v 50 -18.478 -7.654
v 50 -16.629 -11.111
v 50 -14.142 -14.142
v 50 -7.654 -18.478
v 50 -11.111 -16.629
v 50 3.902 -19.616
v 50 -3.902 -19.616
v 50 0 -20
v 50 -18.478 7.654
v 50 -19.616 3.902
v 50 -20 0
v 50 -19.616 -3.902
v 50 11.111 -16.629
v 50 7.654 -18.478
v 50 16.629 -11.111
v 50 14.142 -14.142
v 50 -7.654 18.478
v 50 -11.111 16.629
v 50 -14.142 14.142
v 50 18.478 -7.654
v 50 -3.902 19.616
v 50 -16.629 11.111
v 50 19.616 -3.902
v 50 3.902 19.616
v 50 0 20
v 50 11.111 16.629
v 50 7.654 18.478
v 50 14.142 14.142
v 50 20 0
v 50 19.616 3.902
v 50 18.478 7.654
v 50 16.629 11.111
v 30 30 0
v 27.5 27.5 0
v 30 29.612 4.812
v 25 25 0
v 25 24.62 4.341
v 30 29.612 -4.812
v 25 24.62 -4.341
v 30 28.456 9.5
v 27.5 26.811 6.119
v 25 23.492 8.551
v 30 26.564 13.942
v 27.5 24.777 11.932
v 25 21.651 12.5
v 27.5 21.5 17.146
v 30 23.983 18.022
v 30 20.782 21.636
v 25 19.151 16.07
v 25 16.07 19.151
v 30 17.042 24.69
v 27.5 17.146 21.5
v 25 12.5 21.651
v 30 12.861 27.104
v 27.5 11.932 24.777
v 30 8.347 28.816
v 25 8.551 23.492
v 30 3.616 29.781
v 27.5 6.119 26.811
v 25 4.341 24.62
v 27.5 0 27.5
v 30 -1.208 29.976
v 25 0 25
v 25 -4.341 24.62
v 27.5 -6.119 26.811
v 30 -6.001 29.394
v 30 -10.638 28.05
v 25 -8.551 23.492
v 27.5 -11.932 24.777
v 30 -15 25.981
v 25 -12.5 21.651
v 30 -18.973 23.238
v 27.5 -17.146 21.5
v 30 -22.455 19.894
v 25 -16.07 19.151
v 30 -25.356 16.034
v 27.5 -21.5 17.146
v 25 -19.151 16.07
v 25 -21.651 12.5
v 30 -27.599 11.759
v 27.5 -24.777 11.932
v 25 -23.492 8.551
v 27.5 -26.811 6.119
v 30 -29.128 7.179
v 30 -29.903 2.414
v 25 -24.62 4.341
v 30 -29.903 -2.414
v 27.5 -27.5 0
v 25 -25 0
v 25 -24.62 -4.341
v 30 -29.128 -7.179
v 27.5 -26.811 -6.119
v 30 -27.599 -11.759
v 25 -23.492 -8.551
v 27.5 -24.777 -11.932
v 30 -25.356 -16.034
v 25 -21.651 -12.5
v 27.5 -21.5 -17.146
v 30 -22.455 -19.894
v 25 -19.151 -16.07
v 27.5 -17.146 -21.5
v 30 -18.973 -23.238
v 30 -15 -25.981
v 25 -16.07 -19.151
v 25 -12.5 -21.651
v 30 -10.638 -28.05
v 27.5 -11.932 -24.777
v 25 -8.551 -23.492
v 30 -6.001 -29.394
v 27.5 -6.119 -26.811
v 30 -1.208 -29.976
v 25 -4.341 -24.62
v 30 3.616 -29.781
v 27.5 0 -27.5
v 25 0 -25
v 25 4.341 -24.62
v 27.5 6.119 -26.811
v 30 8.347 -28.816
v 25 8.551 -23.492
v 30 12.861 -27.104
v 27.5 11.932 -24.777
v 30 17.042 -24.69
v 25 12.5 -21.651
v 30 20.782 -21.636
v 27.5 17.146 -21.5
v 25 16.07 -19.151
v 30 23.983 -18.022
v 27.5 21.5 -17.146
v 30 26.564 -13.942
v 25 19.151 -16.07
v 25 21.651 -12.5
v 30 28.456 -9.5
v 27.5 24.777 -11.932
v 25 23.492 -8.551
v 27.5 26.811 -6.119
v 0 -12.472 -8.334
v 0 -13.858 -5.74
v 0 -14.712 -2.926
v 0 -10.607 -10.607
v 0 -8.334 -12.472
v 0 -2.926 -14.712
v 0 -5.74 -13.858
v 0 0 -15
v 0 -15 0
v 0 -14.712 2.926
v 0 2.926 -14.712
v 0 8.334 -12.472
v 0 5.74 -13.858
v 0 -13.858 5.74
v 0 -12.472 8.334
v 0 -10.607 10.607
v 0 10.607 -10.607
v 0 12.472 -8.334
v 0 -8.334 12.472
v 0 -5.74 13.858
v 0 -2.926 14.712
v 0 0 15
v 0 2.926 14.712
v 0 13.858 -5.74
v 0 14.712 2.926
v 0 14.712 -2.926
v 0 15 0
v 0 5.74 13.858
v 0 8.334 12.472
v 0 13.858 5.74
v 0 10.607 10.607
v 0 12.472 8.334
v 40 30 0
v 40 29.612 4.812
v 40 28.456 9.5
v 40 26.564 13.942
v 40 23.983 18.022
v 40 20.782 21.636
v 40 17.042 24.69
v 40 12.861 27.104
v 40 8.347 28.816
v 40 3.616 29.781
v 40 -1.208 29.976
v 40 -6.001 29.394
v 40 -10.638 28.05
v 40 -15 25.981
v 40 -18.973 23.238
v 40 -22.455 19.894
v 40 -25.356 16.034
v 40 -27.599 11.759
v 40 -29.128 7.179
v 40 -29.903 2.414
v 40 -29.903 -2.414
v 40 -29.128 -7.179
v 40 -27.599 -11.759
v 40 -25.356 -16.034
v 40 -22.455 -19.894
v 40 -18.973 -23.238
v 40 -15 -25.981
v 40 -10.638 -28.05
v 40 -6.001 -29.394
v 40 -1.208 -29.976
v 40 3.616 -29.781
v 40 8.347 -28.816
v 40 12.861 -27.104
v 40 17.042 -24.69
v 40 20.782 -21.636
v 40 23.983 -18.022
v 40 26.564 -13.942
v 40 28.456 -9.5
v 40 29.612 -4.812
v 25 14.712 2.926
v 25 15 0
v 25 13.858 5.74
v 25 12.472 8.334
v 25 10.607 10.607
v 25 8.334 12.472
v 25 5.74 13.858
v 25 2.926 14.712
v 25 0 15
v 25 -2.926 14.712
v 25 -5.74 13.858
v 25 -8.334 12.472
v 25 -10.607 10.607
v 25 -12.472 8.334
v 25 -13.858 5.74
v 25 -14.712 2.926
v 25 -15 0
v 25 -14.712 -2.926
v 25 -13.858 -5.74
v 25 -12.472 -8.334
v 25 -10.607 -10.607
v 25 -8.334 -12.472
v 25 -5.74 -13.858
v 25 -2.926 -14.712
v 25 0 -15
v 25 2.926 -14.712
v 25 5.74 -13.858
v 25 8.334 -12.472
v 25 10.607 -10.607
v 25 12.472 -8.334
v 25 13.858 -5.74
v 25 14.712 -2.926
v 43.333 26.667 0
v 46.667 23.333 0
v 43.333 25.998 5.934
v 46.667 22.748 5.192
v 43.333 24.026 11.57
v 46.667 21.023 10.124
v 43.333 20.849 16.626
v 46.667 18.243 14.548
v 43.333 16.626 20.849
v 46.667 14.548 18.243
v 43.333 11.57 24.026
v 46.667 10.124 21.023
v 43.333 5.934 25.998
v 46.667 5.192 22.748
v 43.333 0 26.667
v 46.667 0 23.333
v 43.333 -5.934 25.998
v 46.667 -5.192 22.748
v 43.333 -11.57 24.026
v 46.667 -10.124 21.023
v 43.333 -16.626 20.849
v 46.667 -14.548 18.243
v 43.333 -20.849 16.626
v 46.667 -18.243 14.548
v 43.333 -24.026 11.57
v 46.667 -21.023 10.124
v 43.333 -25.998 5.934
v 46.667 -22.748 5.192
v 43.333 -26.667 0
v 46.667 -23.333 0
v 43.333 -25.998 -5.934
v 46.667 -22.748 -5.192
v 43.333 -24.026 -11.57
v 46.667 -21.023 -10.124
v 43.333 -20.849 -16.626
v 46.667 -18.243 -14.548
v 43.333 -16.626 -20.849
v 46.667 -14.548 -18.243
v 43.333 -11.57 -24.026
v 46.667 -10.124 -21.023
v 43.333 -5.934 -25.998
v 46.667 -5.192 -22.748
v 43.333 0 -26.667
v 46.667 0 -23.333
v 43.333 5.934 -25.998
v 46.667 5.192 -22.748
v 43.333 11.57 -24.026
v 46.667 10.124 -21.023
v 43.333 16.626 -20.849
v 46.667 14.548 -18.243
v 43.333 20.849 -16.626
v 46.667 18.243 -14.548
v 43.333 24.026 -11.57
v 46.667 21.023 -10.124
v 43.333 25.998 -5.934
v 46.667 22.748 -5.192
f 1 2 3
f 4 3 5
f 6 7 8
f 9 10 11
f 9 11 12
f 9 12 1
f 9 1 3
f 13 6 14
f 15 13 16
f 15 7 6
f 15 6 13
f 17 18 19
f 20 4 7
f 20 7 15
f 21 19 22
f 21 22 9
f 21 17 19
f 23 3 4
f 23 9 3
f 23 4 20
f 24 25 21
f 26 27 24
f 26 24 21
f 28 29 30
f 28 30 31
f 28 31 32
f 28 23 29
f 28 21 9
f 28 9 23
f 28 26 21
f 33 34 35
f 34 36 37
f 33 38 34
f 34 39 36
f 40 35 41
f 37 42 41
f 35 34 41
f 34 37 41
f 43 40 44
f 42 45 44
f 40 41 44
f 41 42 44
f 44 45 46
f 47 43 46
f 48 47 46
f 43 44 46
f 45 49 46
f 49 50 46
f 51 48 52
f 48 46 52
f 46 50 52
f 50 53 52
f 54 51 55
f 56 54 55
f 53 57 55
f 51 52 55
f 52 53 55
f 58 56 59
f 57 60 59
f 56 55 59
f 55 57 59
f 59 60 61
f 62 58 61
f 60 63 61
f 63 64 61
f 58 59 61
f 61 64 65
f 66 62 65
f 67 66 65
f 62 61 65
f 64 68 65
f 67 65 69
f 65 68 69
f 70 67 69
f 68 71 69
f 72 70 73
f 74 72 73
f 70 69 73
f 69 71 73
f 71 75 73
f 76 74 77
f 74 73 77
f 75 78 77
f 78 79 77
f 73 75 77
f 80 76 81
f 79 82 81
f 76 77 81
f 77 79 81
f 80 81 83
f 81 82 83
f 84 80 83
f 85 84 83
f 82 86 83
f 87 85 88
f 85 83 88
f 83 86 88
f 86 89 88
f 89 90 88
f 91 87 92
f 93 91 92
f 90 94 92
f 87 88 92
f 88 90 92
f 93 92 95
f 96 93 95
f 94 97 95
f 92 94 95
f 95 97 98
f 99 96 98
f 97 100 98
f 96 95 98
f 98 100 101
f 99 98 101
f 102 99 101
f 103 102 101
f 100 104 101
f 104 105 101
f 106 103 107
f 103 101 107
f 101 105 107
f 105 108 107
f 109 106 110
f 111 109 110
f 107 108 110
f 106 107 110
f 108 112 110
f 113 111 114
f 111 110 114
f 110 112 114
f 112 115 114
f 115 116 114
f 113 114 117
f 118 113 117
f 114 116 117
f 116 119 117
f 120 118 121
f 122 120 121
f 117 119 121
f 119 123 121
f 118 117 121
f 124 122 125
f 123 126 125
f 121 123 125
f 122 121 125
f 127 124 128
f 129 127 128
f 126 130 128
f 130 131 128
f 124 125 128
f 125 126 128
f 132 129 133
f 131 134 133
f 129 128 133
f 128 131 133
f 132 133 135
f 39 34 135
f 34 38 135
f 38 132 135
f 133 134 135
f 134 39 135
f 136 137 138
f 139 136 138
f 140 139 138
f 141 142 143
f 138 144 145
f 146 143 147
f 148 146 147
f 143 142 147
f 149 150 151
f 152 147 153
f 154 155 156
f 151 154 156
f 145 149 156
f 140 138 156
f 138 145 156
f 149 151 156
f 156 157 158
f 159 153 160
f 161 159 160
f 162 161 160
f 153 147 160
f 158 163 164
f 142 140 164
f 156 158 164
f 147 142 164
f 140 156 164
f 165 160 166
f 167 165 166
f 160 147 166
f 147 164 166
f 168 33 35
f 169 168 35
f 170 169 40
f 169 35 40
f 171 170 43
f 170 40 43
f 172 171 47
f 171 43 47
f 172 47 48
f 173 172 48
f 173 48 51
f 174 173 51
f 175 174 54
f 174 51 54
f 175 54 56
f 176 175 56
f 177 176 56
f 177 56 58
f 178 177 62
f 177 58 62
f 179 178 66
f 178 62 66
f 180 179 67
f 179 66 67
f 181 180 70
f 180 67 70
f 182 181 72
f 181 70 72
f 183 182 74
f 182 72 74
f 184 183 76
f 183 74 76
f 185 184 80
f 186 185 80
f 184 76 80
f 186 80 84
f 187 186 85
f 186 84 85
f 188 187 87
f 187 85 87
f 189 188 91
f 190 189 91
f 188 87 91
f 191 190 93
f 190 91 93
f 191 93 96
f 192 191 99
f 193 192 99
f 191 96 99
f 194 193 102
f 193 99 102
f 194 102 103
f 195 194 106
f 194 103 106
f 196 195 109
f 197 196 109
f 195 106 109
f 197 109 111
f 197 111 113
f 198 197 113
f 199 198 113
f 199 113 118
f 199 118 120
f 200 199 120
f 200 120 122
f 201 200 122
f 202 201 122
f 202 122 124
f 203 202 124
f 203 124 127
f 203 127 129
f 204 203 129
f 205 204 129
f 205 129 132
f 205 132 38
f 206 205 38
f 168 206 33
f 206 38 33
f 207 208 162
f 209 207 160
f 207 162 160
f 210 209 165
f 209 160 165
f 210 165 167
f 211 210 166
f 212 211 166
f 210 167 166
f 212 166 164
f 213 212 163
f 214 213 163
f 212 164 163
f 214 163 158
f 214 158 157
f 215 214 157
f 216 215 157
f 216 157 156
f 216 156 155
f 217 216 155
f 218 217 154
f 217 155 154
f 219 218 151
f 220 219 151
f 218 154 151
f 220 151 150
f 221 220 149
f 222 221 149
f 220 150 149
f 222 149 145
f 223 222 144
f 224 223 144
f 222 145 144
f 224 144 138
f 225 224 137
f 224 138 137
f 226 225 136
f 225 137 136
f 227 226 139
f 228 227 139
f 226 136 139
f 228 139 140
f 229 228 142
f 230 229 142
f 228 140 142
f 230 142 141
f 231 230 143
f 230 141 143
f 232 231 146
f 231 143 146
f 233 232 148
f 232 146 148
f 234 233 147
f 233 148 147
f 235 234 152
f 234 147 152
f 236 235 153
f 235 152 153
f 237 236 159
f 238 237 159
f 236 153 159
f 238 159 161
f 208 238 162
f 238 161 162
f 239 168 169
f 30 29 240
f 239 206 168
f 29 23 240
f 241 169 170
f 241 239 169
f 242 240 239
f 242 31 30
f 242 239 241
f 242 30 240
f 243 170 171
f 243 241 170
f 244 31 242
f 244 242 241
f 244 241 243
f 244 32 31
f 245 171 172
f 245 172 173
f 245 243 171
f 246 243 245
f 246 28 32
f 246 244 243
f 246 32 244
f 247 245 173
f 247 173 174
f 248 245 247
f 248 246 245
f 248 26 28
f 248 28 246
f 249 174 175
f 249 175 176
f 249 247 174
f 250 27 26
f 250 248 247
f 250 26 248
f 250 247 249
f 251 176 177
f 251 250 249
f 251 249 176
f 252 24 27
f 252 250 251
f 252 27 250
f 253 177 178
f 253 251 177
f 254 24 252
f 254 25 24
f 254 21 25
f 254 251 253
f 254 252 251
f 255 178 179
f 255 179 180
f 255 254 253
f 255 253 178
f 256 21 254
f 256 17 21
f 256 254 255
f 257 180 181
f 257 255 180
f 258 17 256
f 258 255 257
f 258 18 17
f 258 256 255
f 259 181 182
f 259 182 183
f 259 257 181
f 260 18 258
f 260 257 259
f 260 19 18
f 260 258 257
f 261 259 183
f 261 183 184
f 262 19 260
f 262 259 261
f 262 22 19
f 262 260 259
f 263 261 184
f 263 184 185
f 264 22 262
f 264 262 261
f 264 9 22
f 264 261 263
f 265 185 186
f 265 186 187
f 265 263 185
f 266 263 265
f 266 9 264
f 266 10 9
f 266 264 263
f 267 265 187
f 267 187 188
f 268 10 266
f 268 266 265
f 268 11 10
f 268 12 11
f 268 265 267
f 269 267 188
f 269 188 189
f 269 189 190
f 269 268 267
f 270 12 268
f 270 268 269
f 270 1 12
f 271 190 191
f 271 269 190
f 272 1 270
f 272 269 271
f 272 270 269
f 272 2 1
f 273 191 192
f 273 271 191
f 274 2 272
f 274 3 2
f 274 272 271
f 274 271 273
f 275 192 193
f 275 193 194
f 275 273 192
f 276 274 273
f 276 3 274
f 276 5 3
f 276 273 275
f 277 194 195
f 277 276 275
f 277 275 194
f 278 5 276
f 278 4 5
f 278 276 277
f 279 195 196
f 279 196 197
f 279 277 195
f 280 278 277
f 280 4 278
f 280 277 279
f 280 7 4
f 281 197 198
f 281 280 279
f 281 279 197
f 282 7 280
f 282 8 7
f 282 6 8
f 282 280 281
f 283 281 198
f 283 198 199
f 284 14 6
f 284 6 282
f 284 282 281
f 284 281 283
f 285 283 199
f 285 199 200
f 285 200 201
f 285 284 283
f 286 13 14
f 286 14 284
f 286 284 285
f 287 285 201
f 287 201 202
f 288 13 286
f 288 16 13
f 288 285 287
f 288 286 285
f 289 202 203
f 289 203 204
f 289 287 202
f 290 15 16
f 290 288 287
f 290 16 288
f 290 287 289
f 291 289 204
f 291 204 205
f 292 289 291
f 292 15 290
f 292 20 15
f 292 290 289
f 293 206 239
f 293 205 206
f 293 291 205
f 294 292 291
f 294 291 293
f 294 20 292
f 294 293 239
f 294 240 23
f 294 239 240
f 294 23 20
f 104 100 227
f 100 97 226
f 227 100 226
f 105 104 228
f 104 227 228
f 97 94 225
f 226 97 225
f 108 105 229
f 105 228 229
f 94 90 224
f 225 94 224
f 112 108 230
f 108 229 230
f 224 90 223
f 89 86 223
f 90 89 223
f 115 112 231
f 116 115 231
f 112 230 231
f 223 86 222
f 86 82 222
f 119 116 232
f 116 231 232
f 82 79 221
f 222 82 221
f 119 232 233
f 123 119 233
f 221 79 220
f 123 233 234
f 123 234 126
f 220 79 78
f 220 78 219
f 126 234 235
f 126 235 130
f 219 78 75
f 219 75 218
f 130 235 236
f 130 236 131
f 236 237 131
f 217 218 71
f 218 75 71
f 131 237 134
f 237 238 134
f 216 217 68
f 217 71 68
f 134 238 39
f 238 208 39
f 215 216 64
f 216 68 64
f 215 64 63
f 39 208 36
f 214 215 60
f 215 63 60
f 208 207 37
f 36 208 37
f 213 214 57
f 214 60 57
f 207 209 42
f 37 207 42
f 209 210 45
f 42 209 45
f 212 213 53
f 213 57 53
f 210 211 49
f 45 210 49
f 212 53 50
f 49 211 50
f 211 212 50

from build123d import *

# Parameters (mm, degrees)
F0_R     = 15
F4_DEPTH = 25
F1_R     = 30
F5_DEPTH = 25
F2_SIZE  = 10
F3_SIZE  = 5


with BuildPart() as f4:
    # F0 (on Right) → F4 (new body)
    with BuildSketch(Plane.YZ):
        Circle(F0_R)
    extrude(amount=F4_DEPTH)

    # F1 (on face) → F5 (join)
    with BuildSketch(Plane.YZ.offset(25)):
        Circle(F1_R)
    extrude(amount=F5_DEPTH)

    # F2
    f2_edges = [f4.edges().sort_by_distance(p)[0] for p in [
        (50, -30, 0),
    ]]
    chamfer(f2_edges, length=F2_SIZE)

    # F3
    f3_edges = [f4.edges().sort_by_distance(p)[0] for p in [
        (25, -30, 0),
    ]]
    chamfer(f3_edges, length=F3_SIZE)


solid = f4.part
